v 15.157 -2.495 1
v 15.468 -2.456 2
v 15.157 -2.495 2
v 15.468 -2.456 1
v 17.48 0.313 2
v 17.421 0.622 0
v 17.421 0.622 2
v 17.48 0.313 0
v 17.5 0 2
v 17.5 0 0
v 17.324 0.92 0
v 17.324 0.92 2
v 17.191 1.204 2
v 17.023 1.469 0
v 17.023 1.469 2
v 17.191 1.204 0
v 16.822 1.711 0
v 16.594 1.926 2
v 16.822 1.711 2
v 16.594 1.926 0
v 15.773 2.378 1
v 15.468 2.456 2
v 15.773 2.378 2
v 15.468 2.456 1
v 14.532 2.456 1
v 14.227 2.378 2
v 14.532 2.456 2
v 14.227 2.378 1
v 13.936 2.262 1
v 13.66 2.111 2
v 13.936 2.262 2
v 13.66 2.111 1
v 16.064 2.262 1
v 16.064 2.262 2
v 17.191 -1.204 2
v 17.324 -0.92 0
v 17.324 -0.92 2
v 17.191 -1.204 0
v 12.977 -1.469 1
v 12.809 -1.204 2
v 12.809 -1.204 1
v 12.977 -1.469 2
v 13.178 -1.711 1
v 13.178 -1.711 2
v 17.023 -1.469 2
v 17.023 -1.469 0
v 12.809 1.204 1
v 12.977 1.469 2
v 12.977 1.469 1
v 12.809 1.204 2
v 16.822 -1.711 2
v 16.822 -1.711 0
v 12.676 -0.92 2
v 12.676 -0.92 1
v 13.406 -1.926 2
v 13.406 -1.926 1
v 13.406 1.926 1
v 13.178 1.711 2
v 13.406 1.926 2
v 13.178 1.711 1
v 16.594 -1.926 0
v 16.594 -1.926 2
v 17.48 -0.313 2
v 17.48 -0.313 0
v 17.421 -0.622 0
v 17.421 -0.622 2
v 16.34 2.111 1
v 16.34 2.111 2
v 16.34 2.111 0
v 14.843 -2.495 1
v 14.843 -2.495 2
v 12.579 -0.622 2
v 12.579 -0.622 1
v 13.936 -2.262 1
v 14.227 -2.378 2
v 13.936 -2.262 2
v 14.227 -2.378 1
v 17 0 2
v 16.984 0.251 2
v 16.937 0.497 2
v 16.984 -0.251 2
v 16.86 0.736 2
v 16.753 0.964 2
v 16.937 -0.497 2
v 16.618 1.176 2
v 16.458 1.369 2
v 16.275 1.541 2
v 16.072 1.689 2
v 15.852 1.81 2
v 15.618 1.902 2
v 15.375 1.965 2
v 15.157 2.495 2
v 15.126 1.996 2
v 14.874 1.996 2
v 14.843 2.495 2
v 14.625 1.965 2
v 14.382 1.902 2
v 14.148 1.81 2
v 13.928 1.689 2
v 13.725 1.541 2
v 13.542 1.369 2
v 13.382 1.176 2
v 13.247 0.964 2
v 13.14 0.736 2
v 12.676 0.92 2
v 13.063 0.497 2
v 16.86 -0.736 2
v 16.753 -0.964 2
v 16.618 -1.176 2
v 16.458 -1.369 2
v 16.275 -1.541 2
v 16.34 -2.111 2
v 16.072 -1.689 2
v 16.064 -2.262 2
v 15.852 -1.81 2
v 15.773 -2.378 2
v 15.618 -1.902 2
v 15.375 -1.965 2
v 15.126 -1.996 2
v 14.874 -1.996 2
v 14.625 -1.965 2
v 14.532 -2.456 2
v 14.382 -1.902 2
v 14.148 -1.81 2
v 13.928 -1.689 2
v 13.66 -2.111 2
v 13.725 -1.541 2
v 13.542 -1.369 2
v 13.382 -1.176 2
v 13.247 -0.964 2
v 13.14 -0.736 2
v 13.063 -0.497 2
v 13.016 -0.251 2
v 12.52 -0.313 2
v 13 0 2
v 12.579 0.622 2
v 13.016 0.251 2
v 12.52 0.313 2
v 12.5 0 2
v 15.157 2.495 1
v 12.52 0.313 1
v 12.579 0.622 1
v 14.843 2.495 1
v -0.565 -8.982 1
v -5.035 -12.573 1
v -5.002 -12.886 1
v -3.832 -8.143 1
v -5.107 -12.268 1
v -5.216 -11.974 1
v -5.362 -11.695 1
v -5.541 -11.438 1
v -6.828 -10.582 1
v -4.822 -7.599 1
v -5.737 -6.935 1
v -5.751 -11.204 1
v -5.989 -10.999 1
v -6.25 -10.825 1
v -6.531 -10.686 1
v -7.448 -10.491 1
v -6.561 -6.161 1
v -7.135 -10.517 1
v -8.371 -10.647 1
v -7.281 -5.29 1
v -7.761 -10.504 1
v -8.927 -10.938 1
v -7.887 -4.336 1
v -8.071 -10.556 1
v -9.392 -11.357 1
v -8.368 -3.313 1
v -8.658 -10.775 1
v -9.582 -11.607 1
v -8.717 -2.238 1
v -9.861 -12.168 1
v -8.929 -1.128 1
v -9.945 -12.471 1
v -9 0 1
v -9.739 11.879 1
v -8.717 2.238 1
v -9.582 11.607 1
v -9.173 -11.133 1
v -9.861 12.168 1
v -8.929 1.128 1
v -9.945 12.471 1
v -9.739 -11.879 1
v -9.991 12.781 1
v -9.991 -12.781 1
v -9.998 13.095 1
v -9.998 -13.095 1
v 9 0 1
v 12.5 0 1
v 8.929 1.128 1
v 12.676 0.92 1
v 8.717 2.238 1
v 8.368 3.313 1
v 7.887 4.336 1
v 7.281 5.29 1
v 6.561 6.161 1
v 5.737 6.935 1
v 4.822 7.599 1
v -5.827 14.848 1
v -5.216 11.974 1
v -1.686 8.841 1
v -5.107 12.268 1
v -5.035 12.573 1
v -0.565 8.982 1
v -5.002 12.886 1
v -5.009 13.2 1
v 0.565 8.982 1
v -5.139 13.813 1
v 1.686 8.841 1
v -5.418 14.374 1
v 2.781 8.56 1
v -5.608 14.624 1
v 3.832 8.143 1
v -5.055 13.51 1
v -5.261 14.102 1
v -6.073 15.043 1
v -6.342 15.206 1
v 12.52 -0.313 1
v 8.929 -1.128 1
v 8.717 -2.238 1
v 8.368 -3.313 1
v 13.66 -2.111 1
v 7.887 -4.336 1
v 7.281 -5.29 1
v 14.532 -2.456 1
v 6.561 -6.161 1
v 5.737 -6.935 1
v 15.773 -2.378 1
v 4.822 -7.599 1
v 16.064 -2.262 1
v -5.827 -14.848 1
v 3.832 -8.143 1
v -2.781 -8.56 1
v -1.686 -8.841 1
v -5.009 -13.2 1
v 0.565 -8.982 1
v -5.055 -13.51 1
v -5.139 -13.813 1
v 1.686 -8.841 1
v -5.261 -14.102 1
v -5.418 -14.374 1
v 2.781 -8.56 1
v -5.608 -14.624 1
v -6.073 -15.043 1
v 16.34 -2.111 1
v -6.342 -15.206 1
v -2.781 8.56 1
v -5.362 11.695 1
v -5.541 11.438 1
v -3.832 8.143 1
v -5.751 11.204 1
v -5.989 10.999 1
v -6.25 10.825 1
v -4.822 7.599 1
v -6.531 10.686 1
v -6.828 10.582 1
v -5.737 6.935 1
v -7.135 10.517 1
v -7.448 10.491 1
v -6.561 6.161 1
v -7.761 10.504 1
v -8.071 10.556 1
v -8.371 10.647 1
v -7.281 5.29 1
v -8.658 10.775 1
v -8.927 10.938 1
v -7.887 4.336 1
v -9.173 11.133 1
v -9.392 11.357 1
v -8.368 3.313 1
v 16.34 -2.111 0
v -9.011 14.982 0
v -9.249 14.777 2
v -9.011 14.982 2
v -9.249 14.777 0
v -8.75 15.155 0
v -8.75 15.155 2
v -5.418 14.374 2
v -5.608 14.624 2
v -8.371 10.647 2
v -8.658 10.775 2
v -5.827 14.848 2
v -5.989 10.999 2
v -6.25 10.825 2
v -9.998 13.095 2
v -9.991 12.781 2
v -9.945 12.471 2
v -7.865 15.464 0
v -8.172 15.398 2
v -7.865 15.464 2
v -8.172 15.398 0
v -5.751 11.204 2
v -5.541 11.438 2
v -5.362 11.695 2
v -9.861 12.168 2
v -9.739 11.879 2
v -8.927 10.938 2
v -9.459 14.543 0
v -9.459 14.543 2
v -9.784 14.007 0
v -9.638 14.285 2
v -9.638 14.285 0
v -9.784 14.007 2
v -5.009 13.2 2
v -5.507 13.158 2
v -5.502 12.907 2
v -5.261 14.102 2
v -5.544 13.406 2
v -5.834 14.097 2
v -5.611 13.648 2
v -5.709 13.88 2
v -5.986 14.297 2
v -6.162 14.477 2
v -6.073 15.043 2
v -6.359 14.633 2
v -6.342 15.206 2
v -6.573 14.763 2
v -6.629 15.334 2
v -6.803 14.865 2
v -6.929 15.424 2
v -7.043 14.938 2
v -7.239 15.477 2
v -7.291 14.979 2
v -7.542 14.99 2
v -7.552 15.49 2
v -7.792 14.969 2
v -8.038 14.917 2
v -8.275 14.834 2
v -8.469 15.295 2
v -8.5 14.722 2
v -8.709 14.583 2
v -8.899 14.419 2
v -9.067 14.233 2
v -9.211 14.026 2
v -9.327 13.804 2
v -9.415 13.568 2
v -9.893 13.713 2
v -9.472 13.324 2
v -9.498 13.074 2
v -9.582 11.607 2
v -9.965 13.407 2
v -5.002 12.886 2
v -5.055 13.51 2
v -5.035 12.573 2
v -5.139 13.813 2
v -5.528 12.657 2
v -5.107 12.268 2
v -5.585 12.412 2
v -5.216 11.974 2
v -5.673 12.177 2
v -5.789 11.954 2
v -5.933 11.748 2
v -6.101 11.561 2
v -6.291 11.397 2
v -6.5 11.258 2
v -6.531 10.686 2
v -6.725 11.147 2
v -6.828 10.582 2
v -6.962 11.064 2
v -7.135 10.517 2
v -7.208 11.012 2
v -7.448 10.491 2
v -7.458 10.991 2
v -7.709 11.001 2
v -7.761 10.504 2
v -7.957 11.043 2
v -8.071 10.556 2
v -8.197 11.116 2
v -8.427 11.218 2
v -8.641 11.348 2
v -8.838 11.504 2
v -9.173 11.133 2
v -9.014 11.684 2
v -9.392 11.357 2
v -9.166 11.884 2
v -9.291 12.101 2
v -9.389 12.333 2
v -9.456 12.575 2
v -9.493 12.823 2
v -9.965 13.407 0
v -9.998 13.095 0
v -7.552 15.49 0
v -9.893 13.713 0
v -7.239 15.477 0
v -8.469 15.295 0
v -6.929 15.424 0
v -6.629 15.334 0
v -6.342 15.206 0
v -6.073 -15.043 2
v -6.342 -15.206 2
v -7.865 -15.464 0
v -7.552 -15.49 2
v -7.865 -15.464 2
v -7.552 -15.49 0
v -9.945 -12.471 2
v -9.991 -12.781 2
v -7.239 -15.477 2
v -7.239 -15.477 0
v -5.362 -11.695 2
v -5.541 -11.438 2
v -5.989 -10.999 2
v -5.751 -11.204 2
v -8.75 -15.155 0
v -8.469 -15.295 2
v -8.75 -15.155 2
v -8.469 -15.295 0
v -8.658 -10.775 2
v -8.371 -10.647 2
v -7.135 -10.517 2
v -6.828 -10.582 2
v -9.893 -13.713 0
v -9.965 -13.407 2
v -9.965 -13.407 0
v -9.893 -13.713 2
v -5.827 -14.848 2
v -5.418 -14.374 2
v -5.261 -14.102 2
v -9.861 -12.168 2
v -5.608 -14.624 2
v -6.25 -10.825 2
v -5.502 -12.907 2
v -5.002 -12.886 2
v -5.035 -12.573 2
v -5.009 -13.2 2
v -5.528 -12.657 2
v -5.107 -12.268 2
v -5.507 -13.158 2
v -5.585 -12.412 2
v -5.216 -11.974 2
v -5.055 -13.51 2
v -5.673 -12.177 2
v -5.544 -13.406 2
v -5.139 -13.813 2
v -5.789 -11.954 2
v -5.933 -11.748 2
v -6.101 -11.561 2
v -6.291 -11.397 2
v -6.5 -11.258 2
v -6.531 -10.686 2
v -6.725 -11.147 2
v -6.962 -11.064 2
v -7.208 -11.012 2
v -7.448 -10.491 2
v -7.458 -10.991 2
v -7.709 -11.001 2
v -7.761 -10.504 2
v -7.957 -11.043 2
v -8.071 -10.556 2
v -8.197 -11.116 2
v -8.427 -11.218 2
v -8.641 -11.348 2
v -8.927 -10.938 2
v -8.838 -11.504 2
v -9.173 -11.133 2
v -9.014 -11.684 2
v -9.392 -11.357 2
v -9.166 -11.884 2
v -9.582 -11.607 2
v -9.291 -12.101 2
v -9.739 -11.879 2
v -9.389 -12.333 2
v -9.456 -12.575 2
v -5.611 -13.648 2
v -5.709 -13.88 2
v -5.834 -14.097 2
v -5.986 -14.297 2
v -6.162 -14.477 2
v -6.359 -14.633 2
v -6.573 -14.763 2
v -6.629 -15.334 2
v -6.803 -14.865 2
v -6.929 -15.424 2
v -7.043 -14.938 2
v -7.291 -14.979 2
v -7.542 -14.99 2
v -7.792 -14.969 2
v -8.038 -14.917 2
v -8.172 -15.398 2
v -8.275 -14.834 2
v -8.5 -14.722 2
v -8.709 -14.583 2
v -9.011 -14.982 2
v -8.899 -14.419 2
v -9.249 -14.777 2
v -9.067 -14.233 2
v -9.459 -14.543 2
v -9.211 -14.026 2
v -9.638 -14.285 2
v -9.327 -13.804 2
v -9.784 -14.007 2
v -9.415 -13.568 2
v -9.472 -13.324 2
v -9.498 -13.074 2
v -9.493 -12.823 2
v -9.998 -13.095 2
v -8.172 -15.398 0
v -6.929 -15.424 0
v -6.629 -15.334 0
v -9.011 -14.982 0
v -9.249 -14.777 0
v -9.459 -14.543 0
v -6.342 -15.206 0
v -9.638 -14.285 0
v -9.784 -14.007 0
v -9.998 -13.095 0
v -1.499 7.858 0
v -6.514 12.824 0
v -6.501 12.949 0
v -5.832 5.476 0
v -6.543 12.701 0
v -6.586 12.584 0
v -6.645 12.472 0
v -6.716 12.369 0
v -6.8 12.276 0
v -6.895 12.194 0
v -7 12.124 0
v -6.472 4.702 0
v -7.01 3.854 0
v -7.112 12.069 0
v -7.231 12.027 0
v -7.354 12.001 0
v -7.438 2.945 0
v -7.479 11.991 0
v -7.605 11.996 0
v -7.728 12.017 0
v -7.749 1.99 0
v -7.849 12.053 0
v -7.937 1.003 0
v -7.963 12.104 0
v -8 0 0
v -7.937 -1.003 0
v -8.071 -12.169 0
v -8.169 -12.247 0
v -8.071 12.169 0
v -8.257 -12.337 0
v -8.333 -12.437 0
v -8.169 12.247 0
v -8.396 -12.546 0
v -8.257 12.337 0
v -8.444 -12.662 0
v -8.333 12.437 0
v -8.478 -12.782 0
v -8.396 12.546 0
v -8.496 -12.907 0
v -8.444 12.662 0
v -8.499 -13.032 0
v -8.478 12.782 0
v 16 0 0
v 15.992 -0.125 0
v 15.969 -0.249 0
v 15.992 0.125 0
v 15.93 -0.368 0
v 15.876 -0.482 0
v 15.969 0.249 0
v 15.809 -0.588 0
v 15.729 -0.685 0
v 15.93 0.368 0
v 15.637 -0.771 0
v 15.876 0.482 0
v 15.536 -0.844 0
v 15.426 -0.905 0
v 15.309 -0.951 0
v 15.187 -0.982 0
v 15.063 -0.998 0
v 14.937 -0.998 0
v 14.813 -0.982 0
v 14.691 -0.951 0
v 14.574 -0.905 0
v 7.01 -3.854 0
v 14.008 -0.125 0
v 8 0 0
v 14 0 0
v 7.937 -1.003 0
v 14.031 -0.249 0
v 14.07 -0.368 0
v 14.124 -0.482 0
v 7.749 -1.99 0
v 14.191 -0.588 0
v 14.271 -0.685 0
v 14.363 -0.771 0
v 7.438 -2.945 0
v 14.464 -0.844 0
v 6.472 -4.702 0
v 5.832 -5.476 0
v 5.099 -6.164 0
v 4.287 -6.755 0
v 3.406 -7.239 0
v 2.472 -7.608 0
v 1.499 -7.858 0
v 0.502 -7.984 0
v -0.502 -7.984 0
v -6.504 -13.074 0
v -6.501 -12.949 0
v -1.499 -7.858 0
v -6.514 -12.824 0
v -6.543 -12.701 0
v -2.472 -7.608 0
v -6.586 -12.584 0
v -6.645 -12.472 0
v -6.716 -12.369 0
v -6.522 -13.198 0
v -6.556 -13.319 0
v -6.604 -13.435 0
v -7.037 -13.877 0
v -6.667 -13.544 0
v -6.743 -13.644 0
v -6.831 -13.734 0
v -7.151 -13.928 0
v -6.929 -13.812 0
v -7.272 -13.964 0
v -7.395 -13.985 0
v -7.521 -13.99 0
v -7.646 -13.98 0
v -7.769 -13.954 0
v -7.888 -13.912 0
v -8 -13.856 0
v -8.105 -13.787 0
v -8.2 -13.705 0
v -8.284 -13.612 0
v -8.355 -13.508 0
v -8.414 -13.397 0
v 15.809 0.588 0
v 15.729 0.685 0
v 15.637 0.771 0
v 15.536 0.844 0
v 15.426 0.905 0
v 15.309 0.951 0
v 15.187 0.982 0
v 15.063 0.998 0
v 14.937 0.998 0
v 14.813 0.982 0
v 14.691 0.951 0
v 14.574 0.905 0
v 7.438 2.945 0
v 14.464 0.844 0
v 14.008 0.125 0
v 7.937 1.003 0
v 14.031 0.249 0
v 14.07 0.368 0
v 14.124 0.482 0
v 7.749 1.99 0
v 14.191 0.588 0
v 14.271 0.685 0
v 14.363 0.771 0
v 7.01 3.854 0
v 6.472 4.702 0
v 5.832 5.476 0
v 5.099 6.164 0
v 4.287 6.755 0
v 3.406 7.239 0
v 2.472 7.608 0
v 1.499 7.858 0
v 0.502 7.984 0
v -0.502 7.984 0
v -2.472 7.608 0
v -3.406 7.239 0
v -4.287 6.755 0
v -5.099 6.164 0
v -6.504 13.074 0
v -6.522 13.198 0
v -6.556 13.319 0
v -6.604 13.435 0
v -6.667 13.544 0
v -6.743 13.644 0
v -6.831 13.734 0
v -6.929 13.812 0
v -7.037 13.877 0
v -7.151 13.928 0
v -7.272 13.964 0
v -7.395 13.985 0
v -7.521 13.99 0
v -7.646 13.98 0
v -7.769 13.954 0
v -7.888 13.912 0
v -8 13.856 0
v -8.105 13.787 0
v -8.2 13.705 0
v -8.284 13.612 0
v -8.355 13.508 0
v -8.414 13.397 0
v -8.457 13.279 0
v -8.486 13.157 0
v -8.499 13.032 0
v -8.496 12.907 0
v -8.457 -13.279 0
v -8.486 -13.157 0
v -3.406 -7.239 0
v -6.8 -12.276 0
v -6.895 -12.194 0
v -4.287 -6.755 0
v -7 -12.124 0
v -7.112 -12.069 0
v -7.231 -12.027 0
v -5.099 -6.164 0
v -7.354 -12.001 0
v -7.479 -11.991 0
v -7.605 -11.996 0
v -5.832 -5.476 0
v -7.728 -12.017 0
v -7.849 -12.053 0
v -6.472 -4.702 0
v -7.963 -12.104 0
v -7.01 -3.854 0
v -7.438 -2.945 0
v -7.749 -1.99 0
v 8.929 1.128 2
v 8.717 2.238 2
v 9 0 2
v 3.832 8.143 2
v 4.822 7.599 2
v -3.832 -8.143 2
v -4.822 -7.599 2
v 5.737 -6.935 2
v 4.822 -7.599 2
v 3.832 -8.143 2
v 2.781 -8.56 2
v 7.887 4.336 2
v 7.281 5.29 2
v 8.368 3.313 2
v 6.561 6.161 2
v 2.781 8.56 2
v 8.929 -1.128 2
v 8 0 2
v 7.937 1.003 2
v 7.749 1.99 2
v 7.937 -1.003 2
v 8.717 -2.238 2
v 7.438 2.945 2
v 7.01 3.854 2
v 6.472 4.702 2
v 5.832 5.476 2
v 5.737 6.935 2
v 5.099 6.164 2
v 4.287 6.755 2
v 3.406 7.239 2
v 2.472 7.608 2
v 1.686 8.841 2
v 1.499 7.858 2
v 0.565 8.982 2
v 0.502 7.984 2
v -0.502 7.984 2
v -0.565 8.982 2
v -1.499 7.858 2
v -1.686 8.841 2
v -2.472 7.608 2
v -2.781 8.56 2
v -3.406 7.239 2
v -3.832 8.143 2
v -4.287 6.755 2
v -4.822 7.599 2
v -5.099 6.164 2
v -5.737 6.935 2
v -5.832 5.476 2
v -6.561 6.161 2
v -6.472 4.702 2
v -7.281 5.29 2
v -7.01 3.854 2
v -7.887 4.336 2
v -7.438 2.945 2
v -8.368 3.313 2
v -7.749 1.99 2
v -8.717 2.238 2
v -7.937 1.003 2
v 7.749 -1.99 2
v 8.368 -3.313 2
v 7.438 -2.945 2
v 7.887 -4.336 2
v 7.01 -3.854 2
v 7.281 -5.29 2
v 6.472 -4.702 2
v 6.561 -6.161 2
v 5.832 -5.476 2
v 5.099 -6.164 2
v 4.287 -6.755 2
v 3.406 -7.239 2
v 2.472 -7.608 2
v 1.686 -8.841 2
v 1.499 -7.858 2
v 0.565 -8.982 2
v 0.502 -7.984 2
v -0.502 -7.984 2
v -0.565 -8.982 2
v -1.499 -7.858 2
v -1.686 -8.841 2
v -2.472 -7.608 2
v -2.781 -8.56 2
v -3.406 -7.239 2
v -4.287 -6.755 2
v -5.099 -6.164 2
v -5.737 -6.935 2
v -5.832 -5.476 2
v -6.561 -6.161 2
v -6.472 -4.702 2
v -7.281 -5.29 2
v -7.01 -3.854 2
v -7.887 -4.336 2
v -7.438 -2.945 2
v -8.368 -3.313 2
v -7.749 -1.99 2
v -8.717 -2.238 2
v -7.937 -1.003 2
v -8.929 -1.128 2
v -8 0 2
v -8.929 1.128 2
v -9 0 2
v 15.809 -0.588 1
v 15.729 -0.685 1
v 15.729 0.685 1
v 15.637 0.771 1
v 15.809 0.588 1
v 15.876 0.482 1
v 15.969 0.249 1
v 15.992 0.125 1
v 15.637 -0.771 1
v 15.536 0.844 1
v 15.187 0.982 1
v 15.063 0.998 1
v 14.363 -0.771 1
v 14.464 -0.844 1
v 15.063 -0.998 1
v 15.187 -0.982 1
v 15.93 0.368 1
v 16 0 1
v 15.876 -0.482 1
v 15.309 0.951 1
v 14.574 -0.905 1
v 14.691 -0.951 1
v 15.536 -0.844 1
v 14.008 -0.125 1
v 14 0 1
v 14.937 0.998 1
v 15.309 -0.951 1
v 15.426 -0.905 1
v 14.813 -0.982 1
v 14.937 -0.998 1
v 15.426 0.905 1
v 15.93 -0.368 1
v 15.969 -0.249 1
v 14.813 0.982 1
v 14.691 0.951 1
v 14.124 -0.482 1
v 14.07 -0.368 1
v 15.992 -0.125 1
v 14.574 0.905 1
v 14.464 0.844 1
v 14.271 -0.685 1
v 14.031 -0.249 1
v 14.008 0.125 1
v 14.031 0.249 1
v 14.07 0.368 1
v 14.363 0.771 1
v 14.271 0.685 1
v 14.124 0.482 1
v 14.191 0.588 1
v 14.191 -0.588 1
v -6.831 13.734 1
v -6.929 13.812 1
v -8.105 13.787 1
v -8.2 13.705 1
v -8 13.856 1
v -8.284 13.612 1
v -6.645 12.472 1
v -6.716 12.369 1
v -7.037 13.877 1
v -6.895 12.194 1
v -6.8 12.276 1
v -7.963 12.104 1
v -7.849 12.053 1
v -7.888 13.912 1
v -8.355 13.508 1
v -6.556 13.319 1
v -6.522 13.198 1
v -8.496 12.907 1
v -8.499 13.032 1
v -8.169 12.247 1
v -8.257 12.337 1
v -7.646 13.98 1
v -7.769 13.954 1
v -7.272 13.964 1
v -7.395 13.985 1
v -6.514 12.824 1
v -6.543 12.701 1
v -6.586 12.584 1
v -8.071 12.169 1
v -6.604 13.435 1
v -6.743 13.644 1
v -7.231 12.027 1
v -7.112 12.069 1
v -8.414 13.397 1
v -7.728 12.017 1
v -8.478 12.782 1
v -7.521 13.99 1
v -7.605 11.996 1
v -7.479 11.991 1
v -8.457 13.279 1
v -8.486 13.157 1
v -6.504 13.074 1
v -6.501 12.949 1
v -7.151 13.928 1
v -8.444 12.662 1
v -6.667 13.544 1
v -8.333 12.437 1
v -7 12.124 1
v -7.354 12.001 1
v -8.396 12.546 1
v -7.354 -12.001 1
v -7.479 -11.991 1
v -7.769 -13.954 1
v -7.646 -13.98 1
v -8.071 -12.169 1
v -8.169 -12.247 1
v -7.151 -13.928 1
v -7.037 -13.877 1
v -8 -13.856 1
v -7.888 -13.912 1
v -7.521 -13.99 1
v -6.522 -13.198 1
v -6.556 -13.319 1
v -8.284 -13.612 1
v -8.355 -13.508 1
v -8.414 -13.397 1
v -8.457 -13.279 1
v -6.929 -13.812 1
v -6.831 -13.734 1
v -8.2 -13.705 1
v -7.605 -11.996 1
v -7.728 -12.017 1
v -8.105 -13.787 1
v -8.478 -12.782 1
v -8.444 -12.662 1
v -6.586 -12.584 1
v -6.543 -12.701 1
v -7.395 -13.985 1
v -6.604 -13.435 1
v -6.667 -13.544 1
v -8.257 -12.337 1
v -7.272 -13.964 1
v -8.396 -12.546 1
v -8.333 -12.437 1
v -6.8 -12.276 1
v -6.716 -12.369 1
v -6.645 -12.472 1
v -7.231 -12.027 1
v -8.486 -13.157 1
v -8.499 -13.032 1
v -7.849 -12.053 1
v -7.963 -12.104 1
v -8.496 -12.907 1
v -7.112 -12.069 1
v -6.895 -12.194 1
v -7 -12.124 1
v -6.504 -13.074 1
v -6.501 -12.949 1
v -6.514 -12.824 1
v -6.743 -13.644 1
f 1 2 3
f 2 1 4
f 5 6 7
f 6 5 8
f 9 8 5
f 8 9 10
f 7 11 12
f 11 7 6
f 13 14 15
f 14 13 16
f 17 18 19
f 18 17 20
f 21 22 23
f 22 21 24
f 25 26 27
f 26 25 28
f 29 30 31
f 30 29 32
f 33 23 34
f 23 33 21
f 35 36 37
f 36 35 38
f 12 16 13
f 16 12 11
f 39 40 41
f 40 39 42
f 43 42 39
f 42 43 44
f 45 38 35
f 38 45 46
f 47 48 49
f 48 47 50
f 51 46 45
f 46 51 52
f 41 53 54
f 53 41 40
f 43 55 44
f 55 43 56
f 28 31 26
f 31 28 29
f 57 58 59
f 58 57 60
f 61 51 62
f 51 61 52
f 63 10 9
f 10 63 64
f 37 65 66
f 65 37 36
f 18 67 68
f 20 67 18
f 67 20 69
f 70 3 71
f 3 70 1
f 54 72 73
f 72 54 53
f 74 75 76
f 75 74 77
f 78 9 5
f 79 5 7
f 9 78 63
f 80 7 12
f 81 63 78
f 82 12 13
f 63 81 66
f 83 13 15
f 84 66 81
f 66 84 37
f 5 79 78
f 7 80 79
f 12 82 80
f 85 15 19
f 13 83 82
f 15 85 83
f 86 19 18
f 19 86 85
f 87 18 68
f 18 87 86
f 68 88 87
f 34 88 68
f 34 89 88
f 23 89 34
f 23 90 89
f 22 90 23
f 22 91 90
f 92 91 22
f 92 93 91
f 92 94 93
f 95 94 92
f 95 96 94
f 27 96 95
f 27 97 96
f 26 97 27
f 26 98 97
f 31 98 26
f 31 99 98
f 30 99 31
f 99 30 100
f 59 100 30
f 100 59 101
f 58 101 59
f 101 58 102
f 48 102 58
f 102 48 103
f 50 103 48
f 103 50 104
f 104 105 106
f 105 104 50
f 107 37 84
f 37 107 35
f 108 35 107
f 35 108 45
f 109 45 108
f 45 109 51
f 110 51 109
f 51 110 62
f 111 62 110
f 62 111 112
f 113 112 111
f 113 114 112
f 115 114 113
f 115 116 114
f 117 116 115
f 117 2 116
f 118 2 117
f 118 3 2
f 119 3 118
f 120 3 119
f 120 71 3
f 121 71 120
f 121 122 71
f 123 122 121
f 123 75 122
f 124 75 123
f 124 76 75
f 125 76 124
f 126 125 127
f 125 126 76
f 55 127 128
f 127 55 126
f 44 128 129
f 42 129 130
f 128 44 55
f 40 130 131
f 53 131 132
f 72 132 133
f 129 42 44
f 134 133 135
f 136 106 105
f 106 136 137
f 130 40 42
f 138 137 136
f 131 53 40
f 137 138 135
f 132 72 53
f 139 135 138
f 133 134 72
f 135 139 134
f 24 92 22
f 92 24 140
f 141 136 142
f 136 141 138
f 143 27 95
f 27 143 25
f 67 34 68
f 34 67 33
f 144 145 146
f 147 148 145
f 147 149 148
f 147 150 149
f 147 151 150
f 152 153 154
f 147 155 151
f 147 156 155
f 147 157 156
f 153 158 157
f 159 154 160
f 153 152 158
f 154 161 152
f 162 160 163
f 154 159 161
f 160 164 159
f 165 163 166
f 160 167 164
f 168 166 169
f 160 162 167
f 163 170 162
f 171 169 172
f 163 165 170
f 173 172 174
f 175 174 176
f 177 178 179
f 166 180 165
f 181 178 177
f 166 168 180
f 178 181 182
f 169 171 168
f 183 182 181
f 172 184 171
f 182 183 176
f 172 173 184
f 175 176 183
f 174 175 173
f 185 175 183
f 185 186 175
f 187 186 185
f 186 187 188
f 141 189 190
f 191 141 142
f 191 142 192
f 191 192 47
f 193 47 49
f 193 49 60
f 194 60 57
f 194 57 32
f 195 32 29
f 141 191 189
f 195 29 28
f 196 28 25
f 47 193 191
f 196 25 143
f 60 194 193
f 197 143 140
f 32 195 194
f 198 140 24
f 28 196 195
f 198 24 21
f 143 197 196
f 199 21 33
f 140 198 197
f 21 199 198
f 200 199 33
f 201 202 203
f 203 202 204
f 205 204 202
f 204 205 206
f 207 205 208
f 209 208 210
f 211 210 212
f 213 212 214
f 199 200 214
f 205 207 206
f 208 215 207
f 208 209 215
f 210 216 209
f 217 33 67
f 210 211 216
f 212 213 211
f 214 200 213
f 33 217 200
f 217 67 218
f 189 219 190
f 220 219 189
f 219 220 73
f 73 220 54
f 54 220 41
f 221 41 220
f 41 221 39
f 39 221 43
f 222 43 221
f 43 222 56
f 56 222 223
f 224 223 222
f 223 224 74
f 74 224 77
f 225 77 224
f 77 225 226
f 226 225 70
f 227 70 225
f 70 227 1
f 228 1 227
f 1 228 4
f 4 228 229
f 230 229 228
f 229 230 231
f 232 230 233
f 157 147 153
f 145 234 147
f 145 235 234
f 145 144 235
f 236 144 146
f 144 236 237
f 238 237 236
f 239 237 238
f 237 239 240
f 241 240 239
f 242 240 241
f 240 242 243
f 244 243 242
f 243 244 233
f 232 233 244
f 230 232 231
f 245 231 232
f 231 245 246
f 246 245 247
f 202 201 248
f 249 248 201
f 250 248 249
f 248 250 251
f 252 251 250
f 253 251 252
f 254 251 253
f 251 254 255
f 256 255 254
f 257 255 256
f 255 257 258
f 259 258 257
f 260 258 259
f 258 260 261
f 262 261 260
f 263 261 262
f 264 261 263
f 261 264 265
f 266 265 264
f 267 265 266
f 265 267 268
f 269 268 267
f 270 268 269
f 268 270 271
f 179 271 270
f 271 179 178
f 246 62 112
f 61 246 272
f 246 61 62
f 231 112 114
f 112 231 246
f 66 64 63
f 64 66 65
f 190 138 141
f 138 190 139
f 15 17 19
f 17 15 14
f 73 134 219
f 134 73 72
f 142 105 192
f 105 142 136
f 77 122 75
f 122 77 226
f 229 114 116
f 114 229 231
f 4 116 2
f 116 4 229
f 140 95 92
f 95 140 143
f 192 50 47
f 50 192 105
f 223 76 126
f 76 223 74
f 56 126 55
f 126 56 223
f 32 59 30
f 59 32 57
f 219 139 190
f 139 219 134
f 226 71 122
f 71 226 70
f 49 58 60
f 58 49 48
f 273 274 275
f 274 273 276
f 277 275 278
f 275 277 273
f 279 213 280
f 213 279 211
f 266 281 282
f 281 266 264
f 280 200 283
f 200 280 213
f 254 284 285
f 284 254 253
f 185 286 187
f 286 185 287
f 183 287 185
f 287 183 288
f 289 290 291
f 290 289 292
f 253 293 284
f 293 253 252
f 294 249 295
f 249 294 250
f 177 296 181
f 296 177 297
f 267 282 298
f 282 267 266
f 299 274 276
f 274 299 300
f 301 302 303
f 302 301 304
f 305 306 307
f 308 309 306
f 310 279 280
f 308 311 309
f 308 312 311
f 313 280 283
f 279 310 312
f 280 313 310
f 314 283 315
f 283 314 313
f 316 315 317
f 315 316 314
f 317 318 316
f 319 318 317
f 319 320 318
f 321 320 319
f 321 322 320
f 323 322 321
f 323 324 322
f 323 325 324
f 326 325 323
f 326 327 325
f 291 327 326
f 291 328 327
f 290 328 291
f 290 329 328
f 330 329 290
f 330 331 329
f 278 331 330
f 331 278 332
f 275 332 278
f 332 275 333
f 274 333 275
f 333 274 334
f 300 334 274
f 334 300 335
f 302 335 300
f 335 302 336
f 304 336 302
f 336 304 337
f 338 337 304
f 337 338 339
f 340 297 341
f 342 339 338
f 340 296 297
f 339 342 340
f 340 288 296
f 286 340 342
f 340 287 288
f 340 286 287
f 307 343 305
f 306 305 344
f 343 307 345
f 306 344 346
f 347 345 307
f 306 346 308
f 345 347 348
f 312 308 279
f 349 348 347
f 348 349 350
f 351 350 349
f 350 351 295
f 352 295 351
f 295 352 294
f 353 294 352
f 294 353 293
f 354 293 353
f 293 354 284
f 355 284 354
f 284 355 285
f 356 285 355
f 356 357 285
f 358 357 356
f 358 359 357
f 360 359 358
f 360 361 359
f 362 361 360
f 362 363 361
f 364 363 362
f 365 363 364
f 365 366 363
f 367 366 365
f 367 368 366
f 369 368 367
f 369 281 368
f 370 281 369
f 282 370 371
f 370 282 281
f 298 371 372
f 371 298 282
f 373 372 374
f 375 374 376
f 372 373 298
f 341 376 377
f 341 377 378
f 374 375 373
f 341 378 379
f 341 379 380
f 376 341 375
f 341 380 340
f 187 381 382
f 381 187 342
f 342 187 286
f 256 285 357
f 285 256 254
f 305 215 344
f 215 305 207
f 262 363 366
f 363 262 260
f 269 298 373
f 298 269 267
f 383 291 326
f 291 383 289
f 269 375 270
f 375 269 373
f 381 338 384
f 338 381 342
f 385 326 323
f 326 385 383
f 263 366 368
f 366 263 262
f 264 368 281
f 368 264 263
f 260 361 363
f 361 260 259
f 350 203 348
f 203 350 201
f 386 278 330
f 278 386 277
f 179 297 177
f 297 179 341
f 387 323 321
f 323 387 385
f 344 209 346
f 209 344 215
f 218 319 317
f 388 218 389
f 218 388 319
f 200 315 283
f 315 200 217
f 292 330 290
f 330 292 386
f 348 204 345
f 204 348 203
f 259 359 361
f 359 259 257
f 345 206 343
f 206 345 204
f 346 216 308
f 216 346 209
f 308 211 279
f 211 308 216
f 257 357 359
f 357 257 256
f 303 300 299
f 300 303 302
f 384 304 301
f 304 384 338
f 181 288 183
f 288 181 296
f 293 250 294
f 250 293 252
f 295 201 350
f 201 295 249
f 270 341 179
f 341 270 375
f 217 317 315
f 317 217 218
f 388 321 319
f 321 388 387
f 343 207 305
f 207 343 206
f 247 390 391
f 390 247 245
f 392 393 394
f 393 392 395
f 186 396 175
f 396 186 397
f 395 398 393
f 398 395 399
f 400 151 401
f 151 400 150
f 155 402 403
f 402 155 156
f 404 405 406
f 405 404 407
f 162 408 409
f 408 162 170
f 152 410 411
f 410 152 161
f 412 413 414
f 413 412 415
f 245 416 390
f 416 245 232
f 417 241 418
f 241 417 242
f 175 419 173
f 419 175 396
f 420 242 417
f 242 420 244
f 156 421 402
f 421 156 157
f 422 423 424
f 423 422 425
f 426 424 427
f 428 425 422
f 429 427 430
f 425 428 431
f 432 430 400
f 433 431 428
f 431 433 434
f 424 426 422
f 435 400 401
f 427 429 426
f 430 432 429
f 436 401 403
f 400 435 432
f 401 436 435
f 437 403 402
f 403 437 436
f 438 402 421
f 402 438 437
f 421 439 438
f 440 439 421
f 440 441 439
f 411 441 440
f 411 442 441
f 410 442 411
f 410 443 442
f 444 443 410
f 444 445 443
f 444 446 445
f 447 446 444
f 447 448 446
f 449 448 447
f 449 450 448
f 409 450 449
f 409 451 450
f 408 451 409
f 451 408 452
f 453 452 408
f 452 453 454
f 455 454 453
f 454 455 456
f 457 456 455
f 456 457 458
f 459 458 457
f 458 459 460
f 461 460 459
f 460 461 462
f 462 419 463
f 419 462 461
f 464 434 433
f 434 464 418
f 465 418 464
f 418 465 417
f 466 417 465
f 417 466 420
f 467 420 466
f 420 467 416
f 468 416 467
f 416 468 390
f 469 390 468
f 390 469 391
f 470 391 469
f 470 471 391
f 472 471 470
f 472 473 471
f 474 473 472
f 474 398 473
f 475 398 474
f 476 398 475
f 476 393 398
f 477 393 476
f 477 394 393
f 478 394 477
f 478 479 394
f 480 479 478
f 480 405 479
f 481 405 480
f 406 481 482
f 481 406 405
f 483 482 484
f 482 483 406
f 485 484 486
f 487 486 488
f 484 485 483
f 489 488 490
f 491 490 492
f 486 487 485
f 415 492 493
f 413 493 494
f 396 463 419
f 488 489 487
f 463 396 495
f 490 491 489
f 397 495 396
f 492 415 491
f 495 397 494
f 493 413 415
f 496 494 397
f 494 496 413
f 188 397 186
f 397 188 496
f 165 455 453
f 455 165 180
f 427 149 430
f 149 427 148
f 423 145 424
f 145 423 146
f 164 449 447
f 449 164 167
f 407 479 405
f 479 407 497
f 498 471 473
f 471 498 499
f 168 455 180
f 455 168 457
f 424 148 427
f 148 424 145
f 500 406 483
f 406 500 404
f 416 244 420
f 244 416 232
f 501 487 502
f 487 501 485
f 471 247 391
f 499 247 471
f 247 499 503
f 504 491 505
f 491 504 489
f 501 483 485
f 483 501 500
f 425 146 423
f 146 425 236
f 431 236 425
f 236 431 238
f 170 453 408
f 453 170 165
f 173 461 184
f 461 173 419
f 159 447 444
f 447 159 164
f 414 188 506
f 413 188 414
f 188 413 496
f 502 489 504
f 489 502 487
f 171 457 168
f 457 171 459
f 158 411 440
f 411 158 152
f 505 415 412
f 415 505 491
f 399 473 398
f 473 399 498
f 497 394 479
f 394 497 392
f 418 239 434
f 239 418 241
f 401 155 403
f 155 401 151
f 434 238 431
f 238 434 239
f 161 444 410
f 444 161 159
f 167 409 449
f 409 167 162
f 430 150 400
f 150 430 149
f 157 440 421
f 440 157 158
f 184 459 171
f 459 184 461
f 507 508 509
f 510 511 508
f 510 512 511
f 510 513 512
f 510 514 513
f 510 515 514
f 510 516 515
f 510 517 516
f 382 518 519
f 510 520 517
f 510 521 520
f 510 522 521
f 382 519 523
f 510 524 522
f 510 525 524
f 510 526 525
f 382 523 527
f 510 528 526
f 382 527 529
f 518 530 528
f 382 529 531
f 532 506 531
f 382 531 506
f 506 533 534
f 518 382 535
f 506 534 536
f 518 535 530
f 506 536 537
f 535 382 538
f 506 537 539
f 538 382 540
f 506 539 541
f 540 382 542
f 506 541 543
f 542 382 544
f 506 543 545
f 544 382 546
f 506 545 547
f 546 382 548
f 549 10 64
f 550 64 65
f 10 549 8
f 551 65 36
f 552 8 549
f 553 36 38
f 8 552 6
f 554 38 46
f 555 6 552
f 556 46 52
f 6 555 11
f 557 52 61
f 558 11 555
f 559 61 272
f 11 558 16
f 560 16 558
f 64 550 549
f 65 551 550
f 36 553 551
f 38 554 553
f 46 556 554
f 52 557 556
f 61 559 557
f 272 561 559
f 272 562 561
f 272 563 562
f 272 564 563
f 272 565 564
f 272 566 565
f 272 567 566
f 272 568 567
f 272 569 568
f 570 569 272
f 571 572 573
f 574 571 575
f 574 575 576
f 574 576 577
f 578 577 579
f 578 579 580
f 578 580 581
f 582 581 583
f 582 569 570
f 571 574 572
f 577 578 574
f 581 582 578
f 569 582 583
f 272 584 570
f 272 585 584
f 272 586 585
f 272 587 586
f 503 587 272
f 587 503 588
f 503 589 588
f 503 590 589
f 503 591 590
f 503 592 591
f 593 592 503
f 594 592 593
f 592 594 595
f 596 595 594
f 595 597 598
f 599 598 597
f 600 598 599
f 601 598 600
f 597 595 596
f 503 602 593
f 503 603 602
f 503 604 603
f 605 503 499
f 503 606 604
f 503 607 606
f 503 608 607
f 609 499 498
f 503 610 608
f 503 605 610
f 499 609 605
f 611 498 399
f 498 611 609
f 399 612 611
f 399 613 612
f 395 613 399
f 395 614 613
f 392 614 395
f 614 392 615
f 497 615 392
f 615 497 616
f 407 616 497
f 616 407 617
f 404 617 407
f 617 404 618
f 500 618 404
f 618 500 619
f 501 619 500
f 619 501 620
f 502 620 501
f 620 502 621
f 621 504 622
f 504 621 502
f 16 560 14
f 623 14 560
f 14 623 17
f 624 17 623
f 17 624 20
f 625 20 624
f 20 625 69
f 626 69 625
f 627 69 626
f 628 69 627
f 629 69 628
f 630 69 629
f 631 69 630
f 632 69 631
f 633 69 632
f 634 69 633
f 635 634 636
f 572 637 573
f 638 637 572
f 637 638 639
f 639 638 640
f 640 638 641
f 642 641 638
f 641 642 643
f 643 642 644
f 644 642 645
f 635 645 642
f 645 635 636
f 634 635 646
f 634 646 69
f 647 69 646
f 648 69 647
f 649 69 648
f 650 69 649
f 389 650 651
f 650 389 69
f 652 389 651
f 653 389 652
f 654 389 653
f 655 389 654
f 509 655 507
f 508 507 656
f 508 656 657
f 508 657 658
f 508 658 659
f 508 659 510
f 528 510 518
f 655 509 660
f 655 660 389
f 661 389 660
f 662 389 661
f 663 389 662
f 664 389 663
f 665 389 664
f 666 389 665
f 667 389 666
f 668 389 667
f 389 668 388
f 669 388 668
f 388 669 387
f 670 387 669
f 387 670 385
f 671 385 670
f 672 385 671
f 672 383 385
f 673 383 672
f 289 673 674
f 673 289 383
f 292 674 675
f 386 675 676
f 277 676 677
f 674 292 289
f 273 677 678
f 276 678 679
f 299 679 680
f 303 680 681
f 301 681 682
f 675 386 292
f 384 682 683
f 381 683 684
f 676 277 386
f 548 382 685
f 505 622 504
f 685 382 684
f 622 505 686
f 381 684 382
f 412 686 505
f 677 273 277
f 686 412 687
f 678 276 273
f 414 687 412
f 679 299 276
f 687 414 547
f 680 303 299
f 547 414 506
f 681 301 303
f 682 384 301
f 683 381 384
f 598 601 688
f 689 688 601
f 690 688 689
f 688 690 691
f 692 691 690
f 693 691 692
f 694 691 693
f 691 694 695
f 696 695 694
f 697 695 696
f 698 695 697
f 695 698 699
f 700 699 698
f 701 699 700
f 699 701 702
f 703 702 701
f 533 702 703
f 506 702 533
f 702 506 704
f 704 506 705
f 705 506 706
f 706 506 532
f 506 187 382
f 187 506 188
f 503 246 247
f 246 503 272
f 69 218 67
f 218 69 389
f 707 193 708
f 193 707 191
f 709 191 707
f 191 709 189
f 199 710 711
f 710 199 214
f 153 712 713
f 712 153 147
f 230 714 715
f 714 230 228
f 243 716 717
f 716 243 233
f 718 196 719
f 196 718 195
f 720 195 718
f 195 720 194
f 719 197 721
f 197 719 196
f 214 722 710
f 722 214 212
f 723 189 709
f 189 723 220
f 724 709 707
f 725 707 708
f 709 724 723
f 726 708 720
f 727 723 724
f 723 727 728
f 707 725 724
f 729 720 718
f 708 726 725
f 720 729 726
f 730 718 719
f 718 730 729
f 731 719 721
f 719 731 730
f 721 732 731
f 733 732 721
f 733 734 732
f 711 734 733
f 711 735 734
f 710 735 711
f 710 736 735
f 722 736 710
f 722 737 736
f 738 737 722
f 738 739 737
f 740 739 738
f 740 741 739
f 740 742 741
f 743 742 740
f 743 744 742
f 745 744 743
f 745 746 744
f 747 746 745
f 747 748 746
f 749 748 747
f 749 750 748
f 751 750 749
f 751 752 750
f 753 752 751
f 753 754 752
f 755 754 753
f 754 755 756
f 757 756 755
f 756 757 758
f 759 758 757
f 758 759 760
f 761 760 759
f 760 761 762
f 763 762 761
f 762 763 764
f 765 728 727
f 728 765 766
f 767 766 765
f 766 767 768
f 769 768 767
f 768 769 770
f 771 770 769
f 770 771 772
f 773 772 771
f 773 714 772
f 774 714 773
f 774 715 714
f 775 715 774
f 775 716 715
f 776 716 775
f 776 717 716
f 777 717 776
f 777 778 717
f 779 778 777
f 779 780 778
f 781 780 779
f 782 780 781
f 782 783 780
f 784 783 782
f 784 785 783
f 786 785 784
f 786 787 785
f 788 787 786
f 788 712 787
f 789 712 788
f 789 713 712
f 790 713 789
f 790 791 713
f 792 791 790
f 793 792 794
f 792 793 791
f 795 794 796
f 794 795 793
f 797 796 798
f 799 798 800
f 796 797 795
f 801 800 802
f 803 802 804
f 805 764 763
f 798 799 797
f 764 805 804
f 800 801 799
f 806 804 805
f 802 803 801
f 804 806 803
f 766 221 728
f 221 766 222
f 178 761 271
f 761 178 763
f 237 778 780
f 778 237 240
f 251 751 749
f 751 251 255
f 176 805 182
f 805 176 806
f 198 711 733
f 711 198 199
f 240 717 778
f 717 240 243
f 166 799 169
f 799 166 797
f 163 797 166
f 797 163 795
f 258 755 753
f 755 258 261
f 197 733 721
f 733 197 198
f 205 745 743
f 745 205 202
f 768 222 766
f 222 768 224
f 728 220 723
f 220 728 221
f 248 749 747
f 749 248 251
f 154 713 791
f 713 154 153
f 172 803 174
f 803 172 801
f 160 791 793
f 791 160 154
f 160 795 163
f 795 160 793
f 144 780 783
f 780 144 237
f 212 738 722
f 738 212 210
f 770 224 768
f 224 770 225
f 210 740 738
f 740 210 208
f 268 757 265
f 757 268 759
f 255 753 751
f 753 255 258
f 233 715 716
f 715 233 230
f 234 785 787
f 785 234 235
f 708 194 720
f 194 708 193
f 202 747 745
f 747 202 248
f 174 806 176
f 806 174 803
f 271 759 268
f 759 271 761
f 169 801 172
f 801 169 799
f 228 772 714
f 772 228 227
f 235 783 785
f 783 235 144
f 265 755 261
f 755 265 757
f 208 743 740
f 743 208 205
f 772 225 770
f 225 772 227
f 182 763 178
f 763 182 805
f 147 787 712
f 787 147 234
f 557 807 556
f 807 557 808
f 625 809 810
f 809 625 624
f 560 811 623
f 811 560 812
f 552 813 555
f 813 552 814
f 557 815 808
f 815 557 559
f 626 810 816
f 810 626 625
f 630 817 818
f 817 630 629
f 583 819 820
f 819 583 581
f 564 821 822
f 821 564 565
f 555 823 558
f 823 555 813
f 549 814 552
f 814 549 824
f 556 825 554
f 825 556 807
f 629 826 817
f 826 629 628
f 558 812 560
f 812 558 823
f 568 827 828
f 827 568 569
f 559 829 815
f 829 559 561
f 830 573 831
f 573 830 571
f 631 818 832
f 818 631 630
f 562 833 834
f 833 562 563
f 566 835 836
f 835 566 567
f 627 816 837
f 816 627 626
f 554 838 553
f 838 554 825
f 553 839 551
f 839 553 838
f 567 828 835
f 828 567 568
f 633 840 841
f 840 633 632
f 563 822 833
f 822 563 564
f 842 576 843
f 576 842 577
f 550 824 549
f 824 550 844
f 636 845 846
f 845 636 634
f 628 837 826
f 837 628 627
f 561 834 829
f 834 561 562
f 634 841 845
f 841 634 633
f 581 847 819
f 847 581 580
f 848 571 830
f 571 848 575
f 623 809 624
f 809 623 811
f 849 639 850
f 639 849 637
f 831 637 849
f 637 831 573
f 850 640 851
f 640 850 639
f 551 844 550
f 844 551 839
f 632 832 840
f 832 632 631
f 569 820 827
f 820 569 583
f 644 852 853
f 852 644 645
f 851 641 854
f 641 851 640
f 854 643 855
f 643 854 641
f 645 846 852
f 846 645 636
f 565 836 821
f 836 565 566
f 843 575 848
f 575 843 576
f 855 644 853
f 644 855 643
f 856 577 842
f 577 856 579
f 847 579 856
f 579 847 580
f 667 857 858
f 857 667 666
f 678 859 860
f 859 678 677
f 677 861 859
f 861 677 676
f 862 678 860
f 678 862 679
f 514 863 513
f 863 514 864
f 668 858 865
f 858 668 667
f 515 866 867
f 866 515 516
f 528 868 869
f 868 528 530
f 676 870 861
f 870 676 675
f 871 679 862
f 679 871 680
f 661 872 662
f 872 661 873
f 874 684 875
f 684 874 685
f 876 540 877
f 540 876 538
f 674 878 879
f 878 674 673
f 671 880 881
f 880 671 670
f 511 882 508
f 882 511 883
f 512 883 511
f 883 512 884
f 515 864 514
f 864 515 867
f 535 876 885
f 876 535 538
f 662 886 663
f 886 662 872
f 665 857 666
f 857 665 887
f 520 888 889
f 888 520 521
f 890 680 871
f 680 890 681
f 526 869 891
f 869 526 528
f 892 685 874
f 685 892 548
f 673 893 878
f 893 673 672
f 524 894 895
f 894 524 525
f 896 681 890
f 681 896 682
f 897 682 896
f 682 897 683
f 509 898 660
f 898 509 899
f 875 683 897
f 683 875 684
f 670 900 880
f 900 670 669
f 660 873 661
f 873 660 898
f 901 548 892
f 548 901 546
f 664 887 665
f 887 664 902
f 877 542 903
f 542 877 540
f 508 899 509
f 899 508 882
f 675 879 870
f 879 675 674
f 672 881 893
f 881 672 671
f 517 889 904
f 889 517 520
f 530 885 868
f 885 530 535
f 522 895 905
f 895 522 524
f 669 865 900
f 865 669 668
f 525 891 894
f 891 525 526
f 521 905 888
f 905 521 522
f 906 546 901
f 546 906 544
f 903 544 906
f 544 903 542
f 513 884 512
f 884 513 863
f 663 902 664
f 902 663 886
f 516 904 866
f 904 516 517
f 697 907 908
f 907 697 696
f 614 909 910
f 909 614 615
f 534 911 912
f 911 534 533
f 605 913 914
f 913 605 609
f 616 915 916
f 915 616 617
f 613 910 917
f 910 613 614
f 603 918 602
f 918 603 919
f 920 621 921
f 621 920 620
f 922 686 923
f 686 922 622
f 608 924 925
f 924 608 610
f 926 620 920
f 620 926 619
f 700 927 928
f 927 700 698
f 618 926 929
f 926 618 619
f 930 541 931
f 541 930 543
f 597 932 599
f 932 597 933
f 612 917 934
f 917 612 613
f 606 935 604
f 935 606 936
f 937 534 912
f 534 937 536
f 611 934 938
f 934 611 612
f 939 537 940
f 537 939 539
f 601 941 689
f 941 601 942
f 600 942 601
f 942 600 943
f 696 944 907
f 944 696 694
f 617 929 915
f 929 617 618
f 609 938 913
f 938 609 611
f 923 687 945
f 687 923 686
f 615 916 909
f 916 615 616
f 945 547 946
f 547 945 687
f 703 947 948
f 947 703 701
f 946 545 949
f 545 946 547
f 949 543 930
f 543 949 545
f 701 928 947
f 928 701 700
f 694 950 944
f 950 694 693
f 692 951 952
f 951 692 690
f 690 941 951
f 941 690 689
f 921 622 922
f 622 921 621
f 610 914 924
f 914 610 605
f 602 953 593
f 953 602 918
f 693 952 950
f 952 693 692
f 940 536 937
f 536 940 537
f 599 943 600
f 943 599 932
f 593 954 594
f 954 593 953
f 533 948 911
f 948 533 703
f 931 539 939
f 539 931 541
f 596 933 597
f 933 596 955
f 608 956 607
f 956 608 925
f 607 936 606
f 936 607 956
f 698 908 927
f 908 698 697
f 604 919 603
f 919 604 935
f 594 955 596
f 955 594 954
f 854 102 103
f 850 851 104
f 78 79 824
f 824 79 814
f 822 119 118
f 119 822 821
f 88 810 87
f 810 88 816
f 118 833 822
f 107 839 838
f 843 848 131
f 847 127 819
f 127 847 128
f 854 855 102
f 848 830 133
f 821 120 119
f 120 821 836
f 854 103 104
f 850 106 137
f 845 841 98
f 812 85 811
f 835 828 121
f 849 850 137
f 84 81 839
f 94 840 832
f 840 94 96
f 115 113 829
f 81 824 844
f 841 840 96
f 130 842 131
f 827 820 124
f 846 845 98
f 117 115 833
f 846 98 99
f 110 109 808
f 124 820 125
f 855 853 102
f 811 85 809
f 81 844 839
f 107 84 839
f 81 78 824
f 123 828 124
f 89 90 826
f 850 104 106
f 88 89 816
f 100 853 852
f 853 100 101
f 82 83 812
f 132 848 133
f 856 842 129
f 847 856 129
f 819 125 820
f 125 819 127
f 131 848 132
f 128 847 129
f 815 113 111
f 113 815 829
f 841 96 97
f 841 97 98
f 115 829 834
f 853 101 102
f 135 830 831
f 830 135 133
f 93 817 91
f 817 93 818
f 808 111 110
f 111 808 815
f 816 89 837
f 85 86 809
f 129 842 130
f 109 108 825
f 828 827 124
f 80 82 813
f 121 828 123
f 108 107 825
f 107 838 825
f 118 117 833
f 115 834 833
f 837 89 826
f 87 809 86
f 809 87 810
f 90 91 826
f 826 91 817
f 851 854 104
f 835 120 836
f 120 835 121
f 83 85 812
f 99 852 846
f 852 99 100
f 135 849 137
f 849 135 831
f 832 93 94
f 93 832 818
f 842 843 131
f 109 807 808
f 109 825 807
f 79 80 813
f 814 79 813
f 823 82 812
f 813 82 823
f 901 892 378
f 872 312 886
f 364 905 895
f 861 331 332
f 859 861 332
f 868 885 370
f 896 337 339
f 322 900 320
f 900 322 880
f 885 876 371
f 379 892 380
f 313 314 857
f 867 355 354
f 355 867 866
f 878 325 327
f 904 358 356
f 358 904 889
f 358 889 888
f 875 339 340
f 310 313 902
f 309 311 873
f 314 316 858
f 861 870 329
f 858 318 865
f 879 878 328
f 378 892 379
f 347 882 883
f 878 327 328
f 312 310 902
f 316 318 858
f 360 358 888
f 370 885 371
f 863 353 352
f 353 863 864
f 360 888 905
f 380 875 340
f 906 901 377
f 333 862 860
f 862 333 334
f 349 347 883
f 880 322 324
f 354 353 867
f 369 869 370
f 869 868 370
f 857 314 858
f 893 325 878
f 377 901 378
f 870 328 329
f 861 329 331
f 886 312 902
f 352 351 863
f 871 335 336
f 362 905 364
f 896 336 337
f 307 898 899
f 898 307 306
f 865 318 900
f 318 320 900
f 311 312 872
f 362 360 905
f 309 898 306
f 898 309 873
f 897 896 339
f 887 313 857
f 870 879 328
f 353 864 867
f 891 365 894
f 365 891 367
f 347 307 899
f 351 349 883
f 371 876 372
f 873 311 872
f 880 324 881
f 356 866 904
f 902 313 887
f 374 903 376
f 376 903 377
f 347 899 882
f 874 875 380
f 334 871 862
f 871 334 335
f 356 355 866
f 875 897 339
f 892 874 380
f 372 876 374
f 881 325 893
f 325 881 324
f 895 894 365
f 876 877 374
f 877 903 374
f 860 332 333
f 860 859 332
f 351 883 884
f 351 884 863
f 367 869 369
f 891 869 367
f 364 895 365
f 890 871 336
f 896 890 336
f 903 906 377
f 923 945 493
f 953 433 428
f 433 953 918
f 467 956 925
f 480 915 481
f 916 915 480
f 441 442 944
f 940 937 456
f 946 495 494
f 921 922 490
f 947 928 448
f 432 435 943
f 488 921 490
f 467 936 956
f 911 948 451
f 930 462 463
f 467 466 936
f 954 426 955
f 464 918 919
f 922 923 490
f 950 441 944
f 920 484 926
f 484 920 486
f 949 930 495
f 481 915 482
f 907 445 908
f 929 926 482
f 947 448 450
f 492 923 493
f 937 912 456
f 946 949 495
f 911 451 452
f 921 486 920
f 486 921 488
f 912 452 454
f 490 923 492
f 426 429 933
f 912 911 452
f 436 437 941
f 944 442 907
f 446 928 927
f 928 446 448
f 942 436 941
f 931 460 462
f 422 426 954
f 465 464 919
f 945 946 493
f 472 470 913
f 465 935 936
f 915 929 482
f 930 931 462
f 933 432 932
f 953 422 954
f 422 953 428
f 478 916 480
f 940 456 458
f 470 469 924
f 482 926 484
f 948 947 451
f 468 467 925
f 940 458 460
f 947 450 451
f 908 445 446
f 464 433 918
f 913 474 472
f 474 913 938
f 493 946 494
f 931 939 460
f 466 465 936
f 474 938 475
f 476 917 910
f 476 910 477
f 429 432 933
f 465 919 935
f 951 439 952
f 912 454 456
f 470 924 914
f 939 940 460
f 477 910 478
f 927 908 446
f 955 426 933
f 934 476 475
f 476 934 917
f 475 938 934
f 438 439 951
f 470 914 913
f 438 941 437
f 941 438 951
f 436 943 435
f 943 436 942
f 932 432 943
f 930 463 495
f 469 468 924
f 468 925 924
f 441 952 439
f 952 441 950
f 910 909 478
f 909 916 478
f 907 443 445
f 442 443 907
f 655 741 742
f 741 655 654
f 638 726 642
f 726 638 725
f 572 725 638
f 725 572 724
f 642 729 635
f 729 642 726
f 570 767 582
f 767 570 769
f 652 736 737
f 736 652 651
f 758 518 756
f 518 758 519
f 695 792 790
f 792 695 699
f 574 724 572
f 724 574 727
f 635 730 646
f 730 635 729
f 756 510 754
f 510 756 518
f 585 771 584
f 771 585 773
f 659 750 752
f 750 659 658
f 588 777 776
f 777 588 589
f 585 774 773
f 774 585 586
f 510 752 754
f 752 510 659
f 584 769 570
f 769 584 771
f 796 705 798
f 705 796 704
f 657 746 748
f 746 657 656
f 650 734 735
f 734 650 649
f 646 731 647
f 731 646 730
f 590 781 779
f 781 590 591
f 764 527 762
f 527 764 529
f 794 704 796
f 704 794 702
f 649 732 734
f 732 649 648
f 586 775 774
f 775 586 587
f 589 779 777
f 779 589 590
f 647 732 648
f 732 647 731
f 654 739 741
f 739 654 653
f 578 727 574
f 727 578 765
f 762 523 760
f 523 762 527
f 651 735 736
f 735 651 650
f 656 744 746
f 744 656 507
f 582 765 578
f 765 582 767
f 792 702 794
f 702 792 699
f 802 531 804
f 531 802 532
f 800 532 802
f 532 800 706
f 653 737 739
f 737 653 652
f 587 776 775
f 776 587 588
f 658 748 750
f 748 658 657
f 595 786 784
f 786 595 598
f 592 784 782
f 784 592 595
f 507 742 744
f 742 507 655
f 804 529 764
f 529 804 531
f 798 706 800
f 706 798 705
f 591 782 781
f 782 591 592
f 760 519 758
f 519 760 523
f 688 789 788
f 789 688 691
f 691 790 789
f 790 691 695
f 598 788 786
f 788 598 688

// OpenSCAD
$fn=50;

module three(a=15, d=5, h=1) {
  for (i=[0:120:360]) {
    rotate(i)translate([a,0,0])cylinder(d=d,h=h);
  }
}

module four(a=15, d1=2, d2=4, h=1) {
  for (i=[0:120:360]) {
    rotate(i)translate([a,0,0])cylinder(r1=d1/2,r2=d2/2,h=h);
  }
}

module spodek() {
  hull()three();
  translate([0,0,1])three();
  cylinder(d=18,h=2);
}

difference(){
    spodek();
    union(){
      cylinder(d=16,h=2);
      three(d=2,h=5);
      translate([0,0,1])four();
    }
}
